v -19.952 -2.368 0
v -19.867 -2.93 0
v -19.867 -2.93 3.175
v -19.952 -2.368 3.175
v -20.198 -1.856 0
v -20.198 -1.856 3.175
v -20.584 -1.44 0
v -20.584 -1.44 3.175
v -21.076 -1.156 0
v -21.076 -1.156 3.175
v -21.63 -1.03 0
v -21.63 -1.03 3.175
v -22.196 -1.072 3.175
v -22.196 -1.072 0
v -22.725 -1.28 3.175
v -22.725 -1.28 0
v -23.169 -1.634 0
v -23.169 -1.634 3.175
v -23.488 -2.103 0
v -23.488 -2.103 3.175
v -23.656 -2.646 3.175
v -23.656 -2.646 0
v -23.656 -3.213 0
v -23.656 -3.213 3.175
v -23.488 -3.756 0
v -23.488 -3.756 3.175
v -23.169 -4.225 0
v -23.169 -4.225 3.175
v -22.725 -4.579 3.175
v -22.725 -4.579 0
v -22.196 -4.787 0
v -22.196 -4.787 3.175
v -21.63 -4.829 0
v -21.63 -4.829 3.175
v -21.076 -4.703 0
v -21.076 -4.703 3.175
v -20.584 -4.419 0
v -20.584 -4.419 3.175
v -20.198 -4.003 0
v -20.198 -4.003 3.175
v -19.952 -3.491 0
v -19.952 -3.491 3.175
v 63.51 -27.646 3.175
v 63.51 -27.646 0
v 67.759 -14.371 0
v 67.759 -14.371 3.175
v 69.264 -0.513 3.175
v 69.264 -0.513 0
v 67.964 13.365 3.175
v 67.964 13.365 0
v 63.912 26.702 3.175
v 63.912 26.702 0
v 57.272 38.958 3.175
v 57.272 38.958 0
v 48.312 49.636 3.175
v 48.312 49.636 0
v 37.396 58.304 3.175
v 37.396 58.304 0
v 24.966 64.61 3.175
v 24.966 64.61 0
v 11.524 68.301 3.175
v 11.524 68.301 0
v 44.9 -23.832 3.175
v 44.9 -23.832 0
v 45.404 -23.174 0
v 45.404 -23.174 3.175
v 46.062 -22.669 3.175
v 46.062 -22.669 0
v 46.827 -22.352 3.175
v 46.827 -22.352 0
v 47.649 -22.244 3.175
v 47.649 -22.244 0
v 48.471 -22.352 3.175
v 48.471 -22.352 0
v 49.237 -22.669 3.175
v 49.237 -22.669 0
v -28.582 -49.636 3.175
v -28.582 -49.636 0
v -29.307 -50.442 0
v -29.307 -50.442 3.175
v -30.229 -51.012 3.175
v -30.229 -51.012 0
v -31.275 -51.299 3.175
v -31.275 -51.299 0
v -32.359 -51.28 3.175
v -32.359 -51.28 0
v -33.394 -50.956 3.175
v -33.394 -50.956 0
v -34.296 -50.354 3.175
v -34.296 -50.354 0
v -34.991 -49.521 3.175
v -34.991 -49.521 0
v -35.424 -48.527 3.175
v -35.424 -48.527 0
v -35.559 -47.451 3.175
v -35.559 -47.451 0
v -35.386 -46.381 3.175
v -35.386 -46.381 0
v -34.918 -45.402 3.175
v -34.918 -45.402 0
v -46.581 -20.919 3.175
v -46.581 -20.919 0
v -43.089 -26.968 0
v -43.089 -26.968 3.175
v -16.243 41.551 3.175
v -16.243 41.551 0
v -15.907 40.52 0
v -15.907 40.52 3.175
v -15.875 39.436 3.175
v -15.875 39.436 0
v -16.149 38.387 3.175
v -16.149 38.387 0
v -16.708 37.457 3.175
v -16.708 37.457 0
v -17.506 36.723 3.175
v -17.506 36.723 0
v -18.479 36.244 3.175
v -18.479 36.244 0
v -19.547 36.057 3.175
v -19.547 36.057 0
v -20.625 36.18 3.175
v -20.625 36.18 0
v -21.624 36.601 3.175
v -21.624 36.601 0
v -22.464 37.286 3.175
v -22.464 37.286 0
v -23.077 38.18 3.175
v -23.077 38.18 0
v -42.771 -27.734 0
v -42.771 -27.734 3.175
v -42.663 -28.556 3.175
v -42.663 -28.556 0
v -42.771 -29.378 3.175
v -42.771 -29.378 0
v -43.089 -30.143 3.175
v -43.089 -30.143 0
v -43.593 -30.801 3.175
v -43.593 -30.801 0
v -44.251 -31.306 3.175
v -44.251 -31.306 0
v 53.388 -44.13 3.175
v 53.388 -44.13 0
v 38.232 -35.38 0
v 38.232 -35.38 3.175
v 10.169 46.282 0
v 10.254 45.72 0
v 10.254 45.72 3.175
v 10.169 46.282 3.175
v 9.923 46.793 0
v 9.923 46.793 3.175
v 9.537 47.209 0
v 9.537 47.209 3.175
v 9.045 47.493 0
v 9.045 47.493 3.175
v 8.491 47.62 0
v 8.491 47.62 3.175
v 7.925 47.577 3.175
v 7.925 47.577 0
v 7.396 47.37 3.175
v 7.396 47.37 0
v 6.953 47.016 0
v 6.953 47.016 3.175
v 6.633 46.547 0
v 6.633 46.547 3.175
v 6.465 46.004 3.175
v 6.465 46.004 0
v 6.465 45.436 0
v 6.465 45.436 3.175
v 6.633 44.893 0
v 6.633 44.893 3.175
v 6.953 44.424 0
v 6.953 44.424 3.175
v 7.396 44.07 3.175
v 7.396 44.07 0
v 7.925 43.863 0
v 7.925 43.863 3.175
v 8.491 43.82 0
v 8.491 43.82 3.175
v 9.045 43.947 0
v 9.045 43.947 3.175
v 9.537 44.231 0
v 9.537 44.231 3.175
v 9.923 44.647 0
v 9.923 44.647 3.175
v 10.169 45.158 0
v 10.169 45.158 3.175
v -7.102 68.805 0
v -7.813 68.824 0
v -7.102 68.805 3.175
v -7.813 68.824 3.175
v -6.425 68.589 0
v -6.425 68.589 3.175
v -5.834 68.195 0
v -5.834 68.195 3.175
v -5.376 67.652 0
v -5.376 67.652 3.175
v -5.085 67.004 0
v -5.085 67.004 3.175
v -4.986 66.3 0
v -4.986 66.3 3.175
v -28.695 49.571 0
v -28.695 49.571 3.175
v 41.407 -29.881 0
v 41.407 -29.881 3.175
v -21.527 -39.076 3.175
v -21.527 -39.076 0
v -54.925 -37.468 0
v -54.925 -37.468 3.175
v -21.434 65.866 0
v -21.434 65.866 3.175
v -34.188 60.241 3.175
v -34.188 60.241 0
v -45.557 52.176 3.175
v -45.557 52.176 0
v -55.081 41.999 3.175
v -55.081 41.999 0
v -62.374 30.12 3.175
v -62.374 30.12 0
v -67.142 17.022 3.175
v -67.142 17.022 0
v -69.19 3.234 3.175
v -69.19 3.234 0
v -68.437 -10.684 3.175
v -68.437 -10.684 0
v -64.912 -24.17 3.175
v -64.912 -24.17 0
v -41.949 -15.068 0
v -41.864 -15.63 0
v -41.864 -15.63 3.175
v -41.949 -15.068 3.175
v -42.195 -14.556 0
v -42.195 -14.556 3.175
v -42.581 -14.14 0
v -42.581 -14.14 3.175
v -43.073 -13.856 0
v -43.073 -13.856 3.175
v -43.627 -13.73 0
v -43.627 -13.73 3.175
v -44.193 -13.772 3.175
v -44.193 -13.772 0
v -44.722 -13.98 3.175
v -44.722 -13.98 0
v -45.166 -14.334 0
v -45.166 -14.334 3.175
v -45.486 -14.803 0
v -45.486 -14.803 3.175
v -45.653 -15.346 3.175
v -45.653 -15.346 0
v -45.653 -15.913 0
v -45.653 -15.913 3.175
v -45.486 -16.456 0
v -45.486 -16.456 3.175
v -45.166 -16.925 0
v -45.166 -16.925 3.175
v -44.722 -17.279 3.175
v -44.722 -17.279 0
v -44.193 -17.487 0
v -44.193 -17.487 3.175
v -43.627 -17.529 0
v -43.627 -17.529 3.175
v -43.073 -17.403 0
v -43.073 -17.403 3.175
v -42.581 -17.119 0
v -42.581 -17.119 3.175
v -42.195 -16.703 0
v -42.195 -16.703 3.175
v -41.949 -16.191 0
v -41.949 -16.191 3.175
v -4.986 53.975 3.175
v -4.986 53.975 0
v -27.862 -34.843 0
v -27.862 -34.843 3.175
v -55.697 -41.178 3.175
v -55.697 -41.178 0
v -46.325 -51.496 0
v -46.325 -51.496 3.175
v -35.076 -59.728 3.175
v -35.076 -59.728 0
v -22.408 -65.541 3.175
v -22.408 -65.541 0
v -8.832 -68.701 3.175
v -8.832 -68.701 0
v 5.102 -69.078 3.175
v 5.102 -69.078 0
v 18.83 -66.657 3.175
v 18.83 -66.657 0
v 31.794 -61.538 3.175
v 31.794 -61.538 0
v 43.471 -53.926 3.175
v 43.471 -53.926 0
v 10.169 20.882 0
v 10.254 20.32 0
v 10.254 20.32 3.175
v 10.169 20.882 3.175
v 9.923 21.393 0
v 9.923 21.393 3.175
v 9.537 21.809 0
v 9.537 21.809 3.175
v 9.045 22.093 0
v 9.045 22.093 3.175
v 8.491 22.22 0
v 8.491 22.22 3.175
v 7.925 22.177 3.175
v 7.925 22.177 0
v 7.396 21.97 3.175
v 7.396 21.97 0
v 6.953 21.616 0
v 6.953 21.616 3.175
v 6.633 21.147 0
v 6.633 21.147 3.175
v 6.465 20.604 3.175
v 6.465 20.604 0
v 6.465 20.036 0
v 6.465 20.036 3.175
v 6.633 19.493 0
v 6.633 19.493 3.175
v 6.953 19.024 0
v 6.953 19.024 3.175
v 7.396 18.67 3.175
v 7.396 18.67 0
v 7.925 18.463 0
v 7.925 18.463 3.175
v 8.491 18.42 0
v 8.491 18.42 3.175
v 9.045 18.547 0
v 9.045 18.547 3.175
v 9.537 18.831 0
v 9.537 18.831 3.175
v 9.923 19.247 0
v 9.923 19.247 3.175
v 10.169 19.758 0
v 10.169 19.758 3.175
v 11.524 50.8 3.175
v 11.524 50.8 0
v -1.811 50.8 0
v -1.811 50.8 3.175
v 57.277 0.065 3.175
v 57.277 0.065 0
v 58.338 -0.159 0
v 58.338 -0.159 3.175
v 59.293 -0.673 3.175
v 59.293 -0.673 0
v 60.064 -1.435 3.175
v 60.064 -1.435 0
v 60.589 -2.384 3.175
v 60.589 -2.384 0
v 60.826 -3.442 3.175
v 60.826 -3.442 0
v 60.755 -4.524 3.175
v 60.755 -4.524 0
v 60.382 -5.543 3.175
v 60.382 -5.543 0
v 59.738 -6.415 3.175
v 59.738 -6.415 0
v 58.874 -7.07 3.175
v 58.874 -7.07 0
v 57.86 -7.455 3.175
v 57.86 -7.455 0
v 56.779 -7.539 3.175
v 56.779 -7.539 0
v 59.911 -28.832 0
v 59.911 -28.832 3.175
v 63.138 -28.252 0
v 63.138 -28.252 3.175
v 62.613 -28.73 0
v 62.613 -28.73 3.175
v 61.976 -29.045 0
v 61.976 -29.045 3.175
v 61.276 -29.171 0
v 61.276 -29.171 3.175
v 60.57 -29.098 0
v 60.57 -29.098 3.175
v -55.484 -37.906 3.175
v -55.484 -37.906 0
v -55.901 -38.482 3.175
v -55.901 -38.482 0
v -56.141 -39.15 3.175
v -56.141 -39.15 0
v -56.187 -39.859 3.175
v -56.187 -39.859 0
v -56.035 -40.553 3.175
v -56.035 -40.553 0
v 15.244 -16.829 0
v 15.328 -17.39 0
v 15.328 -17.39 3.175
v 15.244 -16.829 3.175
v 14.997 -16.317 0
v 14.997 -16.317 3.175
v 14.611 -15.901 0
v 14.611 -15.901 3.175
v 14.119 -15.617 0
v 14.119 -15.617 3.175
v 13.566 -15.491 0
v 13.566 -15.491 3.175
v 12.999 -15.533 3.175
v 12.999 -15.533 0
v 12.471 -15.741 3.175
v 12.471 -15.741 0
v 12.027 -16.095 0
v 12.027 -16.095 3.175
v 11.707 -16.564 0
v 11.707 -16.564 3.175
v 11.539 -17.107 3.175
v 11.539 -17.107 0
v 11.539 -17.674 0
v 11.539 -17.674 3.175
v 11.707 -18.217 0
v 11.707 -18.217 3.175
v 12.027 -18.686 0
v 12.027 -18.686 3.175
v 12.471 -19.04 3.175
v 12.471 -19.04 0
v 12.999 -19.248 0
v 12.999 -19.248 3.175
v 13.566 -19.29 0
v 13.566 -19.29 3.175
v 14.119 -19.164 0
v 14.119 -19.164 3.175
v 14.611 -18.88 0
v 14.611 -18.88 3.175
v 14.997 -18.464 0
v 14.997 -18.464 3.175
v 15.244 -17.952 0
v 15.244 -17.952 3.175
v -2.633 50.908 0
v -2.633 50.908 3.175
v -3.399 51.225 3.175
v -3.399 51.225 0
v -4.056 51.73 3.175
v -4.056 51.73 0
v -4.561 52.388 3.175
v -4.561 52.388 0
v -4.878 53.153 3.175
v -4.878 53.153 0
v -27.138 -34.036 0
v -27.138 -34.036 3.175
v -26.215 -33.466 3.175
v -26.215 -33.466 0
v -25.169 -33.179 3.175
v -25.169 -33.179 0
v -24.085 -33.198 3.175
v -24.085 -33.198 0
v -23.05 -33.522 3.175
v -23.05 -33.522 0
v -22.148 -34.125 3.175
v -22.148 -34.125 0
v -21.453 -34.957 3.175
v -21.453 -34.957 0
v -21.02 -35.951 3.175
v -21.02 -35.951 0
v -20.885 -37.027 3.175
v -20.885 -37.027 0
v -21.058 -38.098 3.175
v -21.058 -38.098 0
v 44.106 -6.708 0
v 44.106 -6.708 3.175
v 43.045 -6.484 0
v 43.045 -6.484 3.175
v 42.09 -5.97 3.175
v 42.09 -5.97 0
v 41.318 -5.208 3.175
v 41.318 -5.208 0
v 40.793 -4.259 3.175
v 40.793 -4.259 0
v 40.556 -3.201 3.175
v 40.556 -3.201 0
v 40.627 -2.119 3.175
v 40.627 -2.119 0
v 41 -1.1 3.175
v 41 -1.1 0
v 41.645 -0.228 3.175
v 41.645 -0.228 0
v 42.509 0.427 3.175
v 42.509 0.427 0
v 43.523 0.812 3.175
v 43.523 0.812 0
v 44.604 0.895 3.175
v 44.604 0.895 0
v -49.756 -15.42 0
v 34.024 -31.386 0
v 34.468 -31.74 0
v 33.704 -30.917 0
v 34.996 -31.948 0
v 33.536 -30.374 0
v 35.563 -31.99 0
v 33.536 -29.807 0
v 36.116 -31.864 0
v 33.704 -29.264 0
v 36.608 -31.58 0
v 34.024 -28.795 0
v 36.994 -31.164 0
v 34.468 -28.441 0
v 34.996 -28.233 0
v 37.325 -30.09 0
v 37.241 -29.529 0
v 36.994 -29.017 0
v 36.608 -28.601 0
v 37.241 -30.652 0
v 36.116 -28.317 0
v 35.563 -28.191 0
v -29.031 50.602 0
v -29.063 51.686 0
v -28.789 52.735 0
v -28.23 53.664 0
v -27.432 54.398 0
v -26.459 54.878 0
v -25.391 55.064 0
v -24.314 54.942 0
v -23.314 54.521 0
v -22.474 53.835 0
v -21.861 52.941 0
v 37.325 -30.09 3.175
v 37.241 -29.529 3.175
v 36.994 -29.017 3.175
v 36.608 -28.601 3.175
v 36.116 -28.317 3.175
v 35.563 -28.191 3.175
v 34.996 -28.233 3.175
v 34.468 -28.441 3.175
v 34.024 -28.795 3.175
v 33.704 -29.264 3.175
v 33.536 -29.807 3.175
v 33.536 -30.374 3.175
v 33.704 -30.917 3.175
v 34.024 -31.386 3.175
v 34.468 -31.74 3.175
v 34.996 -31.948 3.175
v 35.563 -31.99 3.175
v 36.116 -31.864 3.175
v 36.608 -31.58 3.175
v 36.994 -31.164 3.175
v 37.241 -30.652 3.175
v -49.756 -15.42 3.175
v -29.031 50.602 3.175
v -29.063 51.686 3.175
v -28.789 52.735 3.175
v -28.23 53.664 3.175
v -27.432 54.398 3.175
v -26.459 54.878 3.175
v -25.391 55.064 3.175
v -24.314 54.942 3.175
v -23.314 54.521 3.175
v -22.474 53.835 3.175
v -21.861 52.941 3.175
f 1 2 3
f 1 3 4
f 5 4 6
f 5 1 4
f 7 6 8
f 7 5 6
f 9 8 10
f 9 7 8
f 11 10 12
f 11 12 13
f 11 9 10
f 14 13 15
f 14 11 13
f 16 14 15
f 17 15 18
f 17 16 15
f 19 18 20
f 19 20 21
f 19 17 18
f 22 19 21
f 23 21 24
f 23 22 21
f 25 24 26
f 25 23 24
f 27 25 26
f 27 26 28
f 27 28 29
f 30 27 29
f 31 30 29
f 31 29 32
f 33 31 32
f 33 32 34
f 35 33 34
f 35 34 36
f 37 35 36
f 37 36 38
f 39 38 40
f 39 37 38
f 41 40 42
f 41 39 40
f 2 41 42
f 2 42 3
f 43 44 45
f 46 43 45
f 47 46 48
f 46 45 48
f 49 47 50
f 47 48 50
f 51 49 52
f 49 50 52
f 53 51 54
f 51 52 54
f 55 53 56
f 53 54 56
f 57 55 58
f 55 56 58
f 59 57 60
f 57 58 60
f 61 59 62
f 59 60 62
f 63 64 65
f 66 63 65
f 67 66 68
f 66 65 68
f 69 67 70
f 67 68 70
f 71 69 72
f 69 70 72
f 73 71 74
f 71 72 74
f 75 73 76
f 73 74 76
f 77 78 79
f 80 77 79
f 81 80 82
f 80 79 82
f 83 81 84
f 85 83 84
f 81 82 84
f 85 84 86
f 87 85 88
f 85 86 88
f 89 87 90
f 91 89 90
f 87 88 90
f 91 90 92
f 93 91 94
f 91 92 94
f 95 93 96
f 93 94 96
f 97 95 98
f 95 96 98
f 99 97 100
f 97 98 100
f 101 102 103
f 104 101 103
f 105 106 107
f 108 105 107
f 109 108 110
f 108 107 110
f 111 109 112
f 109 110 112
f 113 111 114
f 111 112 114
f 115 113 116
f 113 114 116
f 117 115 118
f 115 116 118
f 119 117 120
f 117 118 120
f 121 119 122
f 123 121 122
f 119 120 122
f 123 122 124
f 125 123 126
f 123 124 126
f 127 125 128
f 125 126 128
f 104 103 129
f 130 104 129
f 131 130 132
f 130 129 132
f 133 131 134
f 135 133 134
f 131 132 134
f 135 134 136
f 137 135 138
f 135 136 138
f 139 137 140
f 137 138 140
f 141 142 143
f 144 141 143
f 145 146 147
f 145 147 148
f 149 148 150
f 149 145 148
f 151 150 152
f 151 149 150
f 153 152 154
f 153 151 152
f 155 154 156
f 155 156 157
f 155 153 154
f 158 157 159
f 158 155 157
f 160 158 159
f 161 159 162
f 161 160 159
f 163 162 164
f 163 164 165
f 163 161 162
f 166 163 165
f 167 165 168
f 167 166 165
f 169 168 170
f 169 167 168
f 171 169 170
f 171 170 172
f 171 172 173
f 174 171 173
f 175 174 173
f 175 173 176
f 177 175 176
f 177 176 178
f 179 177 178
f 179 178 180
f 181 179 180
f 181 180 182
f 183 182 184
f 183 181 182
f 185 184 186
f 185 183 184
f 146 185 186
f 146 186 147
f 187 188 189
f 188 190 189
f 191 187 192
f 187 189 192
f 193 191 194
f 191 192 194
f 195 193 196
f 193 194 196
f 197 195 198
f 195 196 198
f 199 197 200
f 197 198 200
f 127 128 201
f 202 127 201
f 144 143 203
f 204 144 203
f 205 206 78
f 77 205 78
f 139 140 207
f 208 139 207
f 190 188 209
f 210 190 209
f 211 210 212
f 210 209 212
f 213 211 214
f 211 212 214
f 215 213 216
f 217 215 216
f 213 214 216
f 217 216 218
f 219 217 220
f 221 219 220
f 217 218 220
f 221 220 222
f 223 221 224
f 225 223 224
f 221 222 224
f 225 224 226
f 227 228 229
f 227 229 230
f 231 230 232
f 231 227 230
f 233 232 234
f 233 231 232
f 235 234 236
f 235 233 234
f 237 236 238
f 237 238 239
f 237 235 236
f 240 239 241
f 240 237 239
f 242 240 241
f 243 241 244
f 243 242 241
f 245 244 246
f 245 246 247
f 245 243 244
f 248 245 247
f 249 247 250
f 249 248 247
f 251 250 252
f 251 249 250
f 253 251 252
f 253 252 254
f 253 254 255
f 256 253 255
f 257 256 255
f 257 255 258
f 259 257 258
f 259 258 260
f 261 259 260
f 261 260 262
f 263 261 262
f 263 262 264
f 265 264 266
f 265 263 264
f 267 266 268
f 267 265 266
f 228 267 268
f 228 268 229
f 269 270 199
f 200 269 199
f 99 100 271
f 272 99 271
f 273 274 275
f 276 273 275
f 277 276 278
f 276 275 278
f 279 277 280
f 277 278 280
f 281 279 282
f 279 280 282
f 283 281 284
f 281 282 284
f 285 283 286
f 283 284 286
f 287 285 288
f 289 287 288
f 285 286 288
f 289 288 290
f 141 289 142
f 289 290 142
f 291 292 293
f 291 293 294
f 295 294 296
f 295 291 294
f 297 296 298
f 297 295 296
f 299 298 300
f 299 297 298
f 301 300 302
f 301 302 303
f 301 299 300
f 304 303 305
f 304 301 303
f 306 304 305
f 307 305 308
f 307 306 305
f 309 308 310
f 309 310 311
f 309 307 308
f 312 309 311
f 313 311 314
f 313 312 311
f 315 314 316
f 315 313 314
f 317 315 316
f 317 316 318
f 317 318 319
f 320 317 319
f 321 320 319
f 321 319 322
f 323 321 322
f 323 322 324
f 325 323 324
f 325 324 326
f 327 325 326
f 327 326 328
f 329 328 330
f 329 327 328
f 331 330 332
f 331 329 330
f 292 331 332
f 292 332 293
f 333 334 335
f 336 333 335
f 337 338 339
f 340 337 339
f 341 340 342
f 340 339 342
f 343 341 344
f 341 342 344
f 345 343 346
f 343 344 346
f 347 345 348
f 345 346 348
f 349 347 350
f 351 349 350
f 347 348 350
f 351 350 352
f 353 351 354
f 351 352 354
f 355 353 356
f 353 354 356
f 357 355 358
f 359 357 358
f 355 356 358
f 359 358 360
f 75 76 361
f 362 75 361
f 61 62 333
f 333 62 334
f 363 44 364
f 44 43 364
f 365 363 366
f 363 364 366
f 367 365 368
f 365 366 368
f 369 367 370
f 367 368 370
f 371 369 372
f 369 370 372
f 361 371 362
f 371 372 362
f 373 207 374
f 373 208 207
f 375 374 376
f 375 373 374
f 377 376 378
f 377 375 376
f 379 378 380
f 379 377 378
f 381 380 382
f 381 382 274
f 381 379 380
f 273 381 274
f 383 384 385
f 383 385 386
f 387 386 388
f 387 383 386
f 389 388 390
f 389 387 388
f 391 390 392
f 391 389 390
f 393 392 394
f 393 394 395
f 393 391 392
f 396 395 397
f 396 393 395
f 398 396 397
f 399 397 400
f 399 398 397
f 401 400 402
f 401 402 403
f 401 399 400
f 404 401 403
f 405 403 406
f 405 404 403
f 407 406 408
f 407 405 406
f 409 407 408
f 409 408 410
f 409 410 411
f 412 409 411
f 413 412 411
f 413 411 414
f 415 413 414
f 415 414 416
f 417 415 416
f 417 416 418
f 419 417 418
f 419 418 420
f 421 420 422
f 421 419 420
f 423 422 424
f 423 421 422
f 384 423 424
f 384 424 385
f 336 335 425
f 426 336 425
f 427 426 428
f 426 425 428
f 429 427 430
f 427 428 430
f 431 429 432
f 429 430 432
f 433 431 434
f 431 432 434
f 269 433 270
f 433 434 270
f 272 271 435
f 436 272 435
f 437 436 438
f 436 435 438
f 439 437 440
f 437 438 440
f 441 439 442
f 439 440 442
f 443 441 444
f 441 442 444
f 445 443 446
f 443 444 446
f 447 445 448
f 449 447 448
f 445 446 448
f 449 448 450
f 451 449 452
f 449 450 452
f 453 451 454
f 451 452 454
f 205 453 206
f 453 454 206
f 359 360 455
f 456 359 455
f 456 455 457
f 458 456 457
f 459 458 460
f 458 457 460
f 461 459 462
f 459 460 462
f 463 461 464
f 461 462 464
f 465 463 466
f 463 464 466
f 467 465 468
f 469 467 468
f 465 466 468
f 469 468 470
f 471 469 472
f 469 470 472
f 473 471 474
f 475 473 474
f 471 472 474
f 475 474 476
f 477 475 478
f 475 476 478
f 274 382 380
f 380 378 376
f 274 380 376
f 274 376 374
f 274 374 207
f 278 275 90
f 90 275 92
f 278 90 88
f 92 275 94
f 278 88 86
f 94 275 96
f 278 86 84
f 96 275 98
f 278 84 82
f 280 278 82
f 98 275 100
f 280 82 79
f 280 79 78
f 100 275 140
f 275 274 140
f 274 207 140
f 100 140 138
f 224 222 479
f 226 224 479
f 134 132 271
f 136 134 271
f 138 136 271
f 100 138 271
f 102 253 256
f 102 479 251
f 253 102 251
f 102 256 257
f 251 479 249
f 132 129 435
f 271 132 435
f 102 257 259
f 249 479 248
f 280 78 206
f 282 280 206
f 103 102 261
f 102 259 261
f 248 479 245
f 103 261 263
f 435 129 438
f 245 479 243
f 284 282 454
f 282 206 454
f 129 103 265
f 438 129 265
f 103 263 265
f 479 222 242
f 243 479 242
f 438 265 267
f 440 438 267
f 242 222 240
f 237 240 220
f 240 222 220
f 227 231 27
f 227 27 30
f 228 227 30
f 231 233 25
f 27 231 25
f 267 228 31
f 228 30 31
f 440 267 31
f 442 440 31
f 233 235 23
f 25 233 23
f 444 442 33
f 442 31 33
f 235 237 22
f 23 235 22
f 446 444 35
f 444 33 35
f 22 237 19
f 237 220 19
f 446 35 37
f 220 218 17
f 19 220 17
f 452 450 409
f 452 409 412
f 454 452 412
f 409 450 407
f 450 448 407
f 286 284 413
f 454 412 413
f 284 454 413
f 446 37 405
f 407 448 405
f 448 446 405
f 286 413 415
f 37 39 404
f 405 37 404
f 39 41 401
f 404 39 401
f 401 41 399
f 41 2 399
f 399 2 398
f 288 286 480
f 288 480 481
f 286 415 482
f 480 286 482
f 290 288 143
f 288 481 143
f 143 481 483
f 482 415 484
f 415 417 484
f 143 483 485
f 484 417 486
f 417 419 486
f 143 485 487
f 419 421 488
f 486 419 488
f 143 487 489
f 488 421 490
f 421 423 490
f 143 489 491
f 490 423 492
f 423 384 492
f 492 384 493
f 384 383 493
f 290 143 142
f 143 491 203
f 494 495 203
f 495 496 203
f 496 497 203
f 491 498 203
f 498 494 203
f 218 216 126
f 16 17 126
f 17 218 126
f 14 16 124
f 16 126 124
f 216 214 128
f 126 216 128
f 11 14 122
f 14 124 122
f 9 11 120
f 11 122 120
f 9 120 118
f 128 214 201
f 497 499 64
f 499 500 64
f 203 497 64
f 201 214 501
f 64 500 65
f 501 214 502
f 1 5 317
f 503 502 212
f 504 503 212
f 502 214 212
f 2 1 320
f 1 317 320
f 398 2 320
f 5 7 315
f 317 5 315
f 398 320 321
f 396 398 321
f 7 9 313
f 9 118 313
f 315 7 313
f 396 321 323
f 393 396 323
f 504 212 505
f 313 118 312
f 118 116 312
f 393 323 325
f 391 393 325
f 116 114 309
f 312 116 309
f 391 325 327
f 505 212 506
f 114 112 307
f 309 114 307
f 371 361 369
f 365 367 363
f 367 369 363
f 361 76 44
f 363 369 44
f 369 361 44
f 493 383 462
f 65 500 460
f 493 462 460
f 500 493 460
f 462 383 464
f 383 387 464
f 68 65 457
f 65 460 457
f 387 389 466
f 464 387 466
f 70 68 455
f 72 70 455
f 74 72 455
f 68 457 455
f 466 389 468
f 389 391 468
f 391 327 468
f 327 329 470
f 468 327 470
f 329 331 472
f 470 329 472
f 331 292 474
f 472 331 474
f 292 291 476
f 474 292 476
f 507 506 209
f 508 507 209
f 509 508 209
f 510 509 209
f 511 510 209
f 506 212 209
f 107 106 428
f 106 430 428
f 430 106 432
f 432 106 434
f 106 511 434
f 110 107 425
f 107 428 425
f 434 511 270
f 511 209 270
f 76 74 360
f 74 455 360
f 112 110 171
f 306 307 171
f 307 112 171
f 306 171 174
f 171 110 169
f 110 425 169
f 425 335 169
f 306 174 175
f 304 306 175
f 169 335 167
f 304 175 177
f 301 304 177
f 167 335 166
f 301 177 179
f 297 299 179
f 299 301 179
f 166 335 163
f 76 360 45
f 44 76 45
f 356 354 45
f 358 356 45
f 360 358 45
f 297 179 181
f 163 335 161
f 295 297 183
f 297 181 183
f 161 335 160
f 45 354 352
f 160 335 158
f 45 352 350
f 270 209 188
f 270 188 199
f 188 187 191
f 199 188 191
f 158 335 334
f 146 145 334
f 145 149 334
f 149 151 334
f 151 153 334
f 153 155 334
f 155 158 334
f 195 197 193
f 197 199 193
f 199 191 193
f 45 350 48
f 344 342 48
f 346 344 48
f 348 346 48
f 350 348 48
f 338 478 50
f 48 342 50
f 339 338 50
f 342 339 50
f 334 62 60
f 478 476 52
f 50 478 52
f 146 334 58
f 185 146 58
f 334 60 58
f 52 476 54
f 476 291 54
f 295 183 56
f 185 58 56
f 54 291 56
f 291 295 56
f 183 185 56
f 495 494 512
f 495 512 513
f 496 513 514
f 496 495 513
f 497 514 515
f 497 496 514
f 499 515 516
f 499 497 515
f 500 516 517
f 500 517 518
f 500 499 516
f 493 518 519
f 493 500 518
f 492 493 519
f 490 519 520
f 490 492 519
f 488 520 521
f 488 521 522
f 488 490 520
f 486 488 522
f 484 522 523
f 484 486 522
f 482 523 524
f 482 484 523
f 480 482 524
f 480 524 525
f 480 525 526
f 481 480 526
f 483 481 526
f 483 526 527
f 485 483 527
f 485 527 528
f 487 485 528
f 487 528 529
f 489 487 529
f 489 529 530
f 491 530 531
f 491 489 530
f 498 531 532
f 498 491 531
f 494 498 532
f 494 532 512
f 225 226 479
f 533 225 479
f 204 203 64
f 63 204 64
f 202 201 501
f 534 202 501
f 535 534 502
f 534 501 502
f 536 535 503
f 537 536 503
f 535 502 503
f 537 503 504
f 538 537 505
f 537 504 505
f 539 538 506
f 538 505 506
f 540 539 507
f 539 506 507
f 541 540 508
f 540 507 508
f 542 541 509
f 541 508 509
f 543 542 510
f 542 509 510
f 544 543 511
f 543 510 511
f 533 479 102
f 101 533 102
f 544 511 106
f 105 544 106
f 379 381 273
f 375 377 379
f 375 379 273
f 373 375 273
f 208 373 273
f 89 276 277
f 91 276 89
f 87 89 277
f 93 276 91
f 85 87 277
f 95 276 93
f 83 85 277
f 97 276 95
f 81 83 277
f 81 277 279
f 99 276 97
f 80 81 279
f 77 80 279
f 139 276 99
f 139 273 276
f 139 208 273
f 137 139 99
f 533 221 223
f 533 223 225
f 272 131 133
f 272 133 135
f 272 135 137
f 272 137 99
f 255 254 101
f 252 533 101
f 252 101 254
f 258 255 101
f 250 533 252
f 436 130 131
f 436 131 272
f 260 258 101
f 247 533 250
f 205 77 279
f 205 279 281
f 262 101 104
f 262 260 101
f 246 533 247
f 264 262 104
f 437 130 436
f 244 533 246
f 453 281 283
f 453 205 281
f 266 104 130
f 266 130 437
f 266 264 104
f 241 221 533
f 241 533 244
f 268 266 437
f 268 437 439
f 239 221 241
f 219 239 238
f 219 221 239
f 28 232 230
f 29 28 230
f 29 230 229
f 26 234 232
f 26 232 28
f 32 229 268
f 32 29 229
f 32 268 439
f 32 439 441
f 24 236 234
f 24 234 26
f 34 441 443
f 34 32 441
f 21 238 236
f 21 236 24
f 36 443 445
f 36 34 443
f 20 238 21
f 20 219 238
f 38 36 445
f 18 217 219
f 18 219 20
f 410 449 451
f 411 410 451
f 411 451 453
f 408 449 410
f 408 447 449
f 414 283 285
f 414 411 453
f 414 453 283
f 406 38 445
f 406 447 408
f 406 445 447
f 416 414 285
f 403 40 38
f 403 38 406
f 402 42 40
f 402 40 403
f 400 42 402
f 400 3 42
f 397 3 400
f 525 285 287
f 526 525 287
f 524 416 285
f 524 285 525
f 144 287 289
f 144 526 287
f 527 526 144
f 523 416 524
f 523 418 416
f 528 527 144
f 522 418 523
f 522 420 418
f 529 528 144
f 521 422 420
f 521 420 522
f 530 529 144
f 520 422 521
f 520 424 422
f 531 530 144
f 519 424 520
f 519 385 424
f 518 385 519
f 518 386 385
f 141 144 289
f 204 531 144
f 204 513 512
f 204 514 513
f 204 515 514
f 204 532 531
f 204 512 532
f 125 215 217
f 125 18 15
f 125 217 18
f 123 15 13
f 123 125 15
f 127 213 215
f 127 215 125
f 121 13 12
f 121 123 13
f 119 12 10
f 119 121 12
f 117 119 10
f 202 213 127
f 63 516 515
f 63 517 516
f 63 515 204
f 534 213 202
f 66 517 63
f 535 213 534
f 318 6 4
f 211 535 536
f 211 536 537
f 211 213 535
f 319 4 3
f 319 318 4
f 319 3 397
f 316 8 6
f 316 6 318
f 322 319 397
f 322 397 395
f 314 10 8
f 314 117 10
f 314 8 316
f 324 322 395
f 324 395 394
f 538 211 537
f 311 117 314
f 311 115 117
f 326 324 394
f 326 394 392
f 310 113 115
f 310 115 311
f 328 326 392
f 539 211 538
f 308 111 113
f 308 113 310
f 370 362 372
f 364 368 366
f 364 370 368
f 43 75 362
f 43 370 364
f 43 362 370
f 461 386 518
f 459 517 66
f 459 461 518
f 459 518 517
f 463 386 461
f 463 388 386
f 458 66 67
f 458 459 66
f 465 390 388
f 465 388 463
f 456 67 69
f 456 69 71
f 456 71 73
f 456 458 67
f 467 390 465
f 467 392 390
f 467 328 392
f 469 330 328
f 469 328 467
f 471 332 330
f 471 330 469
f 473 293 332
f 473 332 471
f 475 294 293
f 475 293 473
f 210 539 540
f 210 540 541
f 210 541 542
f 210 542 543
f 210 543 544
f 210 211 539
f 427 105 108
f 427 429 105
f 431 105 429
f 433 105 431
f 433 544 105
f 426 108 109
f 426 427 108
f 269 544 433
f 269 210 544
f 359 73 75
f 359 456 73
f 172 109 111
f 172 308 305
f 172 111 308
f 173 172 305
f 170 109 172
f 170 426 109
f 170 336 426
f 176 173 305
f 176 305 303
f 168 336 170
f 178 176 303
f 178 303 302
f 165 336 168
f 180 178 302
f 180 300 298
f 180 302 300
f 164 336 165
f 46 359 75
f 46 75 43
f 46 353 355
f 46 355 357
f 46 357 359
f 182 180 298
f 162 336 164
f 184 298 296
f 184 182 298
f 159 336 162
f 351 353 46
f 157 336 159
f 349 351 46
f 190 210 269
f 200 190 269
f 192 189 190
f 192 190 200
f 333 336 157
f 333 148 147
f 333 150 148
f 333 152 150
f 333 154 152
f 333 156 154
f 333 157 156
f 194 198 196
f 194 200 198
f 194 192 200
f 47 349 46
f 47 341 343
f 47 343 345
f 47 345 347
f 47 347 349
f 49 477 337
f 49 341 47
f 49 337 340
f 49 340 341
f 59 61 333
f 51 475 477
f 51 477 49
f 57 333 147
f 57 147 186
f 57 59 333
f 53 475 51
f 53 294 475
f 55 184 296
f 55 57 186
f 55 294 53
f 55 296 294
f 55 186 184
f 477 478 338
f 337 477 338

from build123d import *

# Parameters (mm, degrees)
SKETCH1_R           = 1.905
BOSS_EXTRUDE1_DEPTH = 3.175
FILLET1_R           = 2.54


with BuildPart() as part:
    # Sketch1 → Boss-Extrude1 (new body)
    with BuildSketch(Plane.XY):
        with BuildLine():
            Line((-64.912044694, -24.170240567), (-49.756080512, -15.419940567))
            Line((-49.756080512, -15.419940567), (-46.581080512, -20.919201881))
            Line((-46.581080512, -20.919201881), (-43.088580512, -26.968389327))
            ThreePointArc((-43.088580512, -26.968389327), (-42.771396671, -29.377639795), (-44.250711169, -31.305519984))
            Line((-44.250711169, -31.305519984), (-57.337460999, -38.861158521))
            ThreePointArc((-57.337460999, -38.861158521), (-3.292499409, -69.187668866), (53.388064694, -44.130359433))
            Line((53.388064694, -44.130359433), (38.232100512, -35.380059433))
            Line((38.232100512, -35.380059433), (41.407100512, -29.880798119))
            Line((41.407100512, -29.880798119), (44.899600512, -23.831610673))
            ThreePointArc((44.899600512, -23.831610673), (46.827480701, -22.352296175), (49.236731169, -22.669480016))
            Line((49.236731169, -22.669480016), (62.323480999, -30.225118553))
            ThreePointArc((62.323480999, -30.225118553), (61.564528571, 31.742446303), (11.52398, 68.3006))
            Line((11.52398, 68.3006), (11.52398, 50.8))
            Line((11.52398, 50.8), (5.17398, 50.8))
            Line((5.17398, 50.8), (-1.81102, 50.8))
            ThreePointArc((-1.81102, 50.8), (-4.05608403, 51.72993597), (-4.98602, 53.975))
            Line((-4.98602, 53.975), (-4.98602, 69.086277074))
            ThreePointArc((-4.98602, 69.086277074), (-58.272029162, 37.445222563), (-64.912044694, -24.170240567))
        make_face()
        with Locations((-43.769171461, -15.629571224)):
            Circle(SKETCH1_R, mode=Mode.SUBTRACT)
        with Locations((-21.772126205, -2.929571224)):
            Circle(SKETCH1_R, mode=Mode.SUBTRACT)
        with Locations((13.423146205, -17.390428776)):
            Circle(SKETCH1_R, mode=Mode.SUBTRACT)
        with Locations((35.420191461, -30.090428776)):
            Circle(SKETCH1_R, mode=Mode.SUBTRACT)
        with Locations((8.34898, 45.72)):
            Circle(SKETCH1_R, mode=Mode.SUBTRACT)
        with Locations((8.34898, 20.32)):
            Circle(SKETCH1_R, mode=Mode.SUBTRACT)
        with BuildLine():
            Line((-21.860648036, 52.941011205), (-16.243380607, 41.550826544))
            ThreePointArc((-16.243380607, 41.550826544), (-17.975255776, 36.448590916), (-23.077491403, 38.180466086))
            Line((-23.077491403, 38.180466086), (-28.694758833, 49.570650747))
            ThreePointArc((-28.694758833, 49.570650747), (-26.962883664, 54.672886375), (-21.860648036, 52.941011205))
        make_face(mode=Mode.SUBTRACT)
        with BuildLine():
            Line((56.778584624, -7.53862906), (44.105761638, -6.708233023))
            ThreePointArc((44.105761638, -6.708233023), (40.553033554, -2.657267317), (44.60399926, 0.895460768))
            Line((44.60399926, 0.895460768), (57.276822246, 0.065064732))
            ThreePointArc((57.276822246, 0.065064732), (60.829550331, -3.985900975), (56.778584624, -7.53862906))
        make_face(mode=Mode.SUBTRACT)
        with BuildLine():
            Line((-34.917936587, -45.402382145), (-27.862381032, -34.84259352))
            ThreePointArc((-27.862381032, -34.84259352), (-22.577777778, -33.7913236), (-21.526507857, -39.075926854))
            Line((-21.526507857, -39.075926854), (-28.582063413, -49.635715479))
            ThreePointArc((-28.582063413, -49.635715479), (-33.866666667, -50.686985399), (-34.917936587, -45.402382145))
        make_face(mode=Mode.SUBTRACT)
    extrude(amount=BOSS_EXTRUDE1_DEPTH)

    # Fillet1
    fillet1_edges = [part.edges().sort_by_distance(p)[0] for p in [
        (-4.98602, 69.086277074, 1.5875),
        (62.323480999, -30.225118553, 1.5875),
        (-57.337460999, -38.861158521, 1.5875),
    ]]
    fillet(fillet1_edges, radius=FILLET1_R)


solid = part.part
